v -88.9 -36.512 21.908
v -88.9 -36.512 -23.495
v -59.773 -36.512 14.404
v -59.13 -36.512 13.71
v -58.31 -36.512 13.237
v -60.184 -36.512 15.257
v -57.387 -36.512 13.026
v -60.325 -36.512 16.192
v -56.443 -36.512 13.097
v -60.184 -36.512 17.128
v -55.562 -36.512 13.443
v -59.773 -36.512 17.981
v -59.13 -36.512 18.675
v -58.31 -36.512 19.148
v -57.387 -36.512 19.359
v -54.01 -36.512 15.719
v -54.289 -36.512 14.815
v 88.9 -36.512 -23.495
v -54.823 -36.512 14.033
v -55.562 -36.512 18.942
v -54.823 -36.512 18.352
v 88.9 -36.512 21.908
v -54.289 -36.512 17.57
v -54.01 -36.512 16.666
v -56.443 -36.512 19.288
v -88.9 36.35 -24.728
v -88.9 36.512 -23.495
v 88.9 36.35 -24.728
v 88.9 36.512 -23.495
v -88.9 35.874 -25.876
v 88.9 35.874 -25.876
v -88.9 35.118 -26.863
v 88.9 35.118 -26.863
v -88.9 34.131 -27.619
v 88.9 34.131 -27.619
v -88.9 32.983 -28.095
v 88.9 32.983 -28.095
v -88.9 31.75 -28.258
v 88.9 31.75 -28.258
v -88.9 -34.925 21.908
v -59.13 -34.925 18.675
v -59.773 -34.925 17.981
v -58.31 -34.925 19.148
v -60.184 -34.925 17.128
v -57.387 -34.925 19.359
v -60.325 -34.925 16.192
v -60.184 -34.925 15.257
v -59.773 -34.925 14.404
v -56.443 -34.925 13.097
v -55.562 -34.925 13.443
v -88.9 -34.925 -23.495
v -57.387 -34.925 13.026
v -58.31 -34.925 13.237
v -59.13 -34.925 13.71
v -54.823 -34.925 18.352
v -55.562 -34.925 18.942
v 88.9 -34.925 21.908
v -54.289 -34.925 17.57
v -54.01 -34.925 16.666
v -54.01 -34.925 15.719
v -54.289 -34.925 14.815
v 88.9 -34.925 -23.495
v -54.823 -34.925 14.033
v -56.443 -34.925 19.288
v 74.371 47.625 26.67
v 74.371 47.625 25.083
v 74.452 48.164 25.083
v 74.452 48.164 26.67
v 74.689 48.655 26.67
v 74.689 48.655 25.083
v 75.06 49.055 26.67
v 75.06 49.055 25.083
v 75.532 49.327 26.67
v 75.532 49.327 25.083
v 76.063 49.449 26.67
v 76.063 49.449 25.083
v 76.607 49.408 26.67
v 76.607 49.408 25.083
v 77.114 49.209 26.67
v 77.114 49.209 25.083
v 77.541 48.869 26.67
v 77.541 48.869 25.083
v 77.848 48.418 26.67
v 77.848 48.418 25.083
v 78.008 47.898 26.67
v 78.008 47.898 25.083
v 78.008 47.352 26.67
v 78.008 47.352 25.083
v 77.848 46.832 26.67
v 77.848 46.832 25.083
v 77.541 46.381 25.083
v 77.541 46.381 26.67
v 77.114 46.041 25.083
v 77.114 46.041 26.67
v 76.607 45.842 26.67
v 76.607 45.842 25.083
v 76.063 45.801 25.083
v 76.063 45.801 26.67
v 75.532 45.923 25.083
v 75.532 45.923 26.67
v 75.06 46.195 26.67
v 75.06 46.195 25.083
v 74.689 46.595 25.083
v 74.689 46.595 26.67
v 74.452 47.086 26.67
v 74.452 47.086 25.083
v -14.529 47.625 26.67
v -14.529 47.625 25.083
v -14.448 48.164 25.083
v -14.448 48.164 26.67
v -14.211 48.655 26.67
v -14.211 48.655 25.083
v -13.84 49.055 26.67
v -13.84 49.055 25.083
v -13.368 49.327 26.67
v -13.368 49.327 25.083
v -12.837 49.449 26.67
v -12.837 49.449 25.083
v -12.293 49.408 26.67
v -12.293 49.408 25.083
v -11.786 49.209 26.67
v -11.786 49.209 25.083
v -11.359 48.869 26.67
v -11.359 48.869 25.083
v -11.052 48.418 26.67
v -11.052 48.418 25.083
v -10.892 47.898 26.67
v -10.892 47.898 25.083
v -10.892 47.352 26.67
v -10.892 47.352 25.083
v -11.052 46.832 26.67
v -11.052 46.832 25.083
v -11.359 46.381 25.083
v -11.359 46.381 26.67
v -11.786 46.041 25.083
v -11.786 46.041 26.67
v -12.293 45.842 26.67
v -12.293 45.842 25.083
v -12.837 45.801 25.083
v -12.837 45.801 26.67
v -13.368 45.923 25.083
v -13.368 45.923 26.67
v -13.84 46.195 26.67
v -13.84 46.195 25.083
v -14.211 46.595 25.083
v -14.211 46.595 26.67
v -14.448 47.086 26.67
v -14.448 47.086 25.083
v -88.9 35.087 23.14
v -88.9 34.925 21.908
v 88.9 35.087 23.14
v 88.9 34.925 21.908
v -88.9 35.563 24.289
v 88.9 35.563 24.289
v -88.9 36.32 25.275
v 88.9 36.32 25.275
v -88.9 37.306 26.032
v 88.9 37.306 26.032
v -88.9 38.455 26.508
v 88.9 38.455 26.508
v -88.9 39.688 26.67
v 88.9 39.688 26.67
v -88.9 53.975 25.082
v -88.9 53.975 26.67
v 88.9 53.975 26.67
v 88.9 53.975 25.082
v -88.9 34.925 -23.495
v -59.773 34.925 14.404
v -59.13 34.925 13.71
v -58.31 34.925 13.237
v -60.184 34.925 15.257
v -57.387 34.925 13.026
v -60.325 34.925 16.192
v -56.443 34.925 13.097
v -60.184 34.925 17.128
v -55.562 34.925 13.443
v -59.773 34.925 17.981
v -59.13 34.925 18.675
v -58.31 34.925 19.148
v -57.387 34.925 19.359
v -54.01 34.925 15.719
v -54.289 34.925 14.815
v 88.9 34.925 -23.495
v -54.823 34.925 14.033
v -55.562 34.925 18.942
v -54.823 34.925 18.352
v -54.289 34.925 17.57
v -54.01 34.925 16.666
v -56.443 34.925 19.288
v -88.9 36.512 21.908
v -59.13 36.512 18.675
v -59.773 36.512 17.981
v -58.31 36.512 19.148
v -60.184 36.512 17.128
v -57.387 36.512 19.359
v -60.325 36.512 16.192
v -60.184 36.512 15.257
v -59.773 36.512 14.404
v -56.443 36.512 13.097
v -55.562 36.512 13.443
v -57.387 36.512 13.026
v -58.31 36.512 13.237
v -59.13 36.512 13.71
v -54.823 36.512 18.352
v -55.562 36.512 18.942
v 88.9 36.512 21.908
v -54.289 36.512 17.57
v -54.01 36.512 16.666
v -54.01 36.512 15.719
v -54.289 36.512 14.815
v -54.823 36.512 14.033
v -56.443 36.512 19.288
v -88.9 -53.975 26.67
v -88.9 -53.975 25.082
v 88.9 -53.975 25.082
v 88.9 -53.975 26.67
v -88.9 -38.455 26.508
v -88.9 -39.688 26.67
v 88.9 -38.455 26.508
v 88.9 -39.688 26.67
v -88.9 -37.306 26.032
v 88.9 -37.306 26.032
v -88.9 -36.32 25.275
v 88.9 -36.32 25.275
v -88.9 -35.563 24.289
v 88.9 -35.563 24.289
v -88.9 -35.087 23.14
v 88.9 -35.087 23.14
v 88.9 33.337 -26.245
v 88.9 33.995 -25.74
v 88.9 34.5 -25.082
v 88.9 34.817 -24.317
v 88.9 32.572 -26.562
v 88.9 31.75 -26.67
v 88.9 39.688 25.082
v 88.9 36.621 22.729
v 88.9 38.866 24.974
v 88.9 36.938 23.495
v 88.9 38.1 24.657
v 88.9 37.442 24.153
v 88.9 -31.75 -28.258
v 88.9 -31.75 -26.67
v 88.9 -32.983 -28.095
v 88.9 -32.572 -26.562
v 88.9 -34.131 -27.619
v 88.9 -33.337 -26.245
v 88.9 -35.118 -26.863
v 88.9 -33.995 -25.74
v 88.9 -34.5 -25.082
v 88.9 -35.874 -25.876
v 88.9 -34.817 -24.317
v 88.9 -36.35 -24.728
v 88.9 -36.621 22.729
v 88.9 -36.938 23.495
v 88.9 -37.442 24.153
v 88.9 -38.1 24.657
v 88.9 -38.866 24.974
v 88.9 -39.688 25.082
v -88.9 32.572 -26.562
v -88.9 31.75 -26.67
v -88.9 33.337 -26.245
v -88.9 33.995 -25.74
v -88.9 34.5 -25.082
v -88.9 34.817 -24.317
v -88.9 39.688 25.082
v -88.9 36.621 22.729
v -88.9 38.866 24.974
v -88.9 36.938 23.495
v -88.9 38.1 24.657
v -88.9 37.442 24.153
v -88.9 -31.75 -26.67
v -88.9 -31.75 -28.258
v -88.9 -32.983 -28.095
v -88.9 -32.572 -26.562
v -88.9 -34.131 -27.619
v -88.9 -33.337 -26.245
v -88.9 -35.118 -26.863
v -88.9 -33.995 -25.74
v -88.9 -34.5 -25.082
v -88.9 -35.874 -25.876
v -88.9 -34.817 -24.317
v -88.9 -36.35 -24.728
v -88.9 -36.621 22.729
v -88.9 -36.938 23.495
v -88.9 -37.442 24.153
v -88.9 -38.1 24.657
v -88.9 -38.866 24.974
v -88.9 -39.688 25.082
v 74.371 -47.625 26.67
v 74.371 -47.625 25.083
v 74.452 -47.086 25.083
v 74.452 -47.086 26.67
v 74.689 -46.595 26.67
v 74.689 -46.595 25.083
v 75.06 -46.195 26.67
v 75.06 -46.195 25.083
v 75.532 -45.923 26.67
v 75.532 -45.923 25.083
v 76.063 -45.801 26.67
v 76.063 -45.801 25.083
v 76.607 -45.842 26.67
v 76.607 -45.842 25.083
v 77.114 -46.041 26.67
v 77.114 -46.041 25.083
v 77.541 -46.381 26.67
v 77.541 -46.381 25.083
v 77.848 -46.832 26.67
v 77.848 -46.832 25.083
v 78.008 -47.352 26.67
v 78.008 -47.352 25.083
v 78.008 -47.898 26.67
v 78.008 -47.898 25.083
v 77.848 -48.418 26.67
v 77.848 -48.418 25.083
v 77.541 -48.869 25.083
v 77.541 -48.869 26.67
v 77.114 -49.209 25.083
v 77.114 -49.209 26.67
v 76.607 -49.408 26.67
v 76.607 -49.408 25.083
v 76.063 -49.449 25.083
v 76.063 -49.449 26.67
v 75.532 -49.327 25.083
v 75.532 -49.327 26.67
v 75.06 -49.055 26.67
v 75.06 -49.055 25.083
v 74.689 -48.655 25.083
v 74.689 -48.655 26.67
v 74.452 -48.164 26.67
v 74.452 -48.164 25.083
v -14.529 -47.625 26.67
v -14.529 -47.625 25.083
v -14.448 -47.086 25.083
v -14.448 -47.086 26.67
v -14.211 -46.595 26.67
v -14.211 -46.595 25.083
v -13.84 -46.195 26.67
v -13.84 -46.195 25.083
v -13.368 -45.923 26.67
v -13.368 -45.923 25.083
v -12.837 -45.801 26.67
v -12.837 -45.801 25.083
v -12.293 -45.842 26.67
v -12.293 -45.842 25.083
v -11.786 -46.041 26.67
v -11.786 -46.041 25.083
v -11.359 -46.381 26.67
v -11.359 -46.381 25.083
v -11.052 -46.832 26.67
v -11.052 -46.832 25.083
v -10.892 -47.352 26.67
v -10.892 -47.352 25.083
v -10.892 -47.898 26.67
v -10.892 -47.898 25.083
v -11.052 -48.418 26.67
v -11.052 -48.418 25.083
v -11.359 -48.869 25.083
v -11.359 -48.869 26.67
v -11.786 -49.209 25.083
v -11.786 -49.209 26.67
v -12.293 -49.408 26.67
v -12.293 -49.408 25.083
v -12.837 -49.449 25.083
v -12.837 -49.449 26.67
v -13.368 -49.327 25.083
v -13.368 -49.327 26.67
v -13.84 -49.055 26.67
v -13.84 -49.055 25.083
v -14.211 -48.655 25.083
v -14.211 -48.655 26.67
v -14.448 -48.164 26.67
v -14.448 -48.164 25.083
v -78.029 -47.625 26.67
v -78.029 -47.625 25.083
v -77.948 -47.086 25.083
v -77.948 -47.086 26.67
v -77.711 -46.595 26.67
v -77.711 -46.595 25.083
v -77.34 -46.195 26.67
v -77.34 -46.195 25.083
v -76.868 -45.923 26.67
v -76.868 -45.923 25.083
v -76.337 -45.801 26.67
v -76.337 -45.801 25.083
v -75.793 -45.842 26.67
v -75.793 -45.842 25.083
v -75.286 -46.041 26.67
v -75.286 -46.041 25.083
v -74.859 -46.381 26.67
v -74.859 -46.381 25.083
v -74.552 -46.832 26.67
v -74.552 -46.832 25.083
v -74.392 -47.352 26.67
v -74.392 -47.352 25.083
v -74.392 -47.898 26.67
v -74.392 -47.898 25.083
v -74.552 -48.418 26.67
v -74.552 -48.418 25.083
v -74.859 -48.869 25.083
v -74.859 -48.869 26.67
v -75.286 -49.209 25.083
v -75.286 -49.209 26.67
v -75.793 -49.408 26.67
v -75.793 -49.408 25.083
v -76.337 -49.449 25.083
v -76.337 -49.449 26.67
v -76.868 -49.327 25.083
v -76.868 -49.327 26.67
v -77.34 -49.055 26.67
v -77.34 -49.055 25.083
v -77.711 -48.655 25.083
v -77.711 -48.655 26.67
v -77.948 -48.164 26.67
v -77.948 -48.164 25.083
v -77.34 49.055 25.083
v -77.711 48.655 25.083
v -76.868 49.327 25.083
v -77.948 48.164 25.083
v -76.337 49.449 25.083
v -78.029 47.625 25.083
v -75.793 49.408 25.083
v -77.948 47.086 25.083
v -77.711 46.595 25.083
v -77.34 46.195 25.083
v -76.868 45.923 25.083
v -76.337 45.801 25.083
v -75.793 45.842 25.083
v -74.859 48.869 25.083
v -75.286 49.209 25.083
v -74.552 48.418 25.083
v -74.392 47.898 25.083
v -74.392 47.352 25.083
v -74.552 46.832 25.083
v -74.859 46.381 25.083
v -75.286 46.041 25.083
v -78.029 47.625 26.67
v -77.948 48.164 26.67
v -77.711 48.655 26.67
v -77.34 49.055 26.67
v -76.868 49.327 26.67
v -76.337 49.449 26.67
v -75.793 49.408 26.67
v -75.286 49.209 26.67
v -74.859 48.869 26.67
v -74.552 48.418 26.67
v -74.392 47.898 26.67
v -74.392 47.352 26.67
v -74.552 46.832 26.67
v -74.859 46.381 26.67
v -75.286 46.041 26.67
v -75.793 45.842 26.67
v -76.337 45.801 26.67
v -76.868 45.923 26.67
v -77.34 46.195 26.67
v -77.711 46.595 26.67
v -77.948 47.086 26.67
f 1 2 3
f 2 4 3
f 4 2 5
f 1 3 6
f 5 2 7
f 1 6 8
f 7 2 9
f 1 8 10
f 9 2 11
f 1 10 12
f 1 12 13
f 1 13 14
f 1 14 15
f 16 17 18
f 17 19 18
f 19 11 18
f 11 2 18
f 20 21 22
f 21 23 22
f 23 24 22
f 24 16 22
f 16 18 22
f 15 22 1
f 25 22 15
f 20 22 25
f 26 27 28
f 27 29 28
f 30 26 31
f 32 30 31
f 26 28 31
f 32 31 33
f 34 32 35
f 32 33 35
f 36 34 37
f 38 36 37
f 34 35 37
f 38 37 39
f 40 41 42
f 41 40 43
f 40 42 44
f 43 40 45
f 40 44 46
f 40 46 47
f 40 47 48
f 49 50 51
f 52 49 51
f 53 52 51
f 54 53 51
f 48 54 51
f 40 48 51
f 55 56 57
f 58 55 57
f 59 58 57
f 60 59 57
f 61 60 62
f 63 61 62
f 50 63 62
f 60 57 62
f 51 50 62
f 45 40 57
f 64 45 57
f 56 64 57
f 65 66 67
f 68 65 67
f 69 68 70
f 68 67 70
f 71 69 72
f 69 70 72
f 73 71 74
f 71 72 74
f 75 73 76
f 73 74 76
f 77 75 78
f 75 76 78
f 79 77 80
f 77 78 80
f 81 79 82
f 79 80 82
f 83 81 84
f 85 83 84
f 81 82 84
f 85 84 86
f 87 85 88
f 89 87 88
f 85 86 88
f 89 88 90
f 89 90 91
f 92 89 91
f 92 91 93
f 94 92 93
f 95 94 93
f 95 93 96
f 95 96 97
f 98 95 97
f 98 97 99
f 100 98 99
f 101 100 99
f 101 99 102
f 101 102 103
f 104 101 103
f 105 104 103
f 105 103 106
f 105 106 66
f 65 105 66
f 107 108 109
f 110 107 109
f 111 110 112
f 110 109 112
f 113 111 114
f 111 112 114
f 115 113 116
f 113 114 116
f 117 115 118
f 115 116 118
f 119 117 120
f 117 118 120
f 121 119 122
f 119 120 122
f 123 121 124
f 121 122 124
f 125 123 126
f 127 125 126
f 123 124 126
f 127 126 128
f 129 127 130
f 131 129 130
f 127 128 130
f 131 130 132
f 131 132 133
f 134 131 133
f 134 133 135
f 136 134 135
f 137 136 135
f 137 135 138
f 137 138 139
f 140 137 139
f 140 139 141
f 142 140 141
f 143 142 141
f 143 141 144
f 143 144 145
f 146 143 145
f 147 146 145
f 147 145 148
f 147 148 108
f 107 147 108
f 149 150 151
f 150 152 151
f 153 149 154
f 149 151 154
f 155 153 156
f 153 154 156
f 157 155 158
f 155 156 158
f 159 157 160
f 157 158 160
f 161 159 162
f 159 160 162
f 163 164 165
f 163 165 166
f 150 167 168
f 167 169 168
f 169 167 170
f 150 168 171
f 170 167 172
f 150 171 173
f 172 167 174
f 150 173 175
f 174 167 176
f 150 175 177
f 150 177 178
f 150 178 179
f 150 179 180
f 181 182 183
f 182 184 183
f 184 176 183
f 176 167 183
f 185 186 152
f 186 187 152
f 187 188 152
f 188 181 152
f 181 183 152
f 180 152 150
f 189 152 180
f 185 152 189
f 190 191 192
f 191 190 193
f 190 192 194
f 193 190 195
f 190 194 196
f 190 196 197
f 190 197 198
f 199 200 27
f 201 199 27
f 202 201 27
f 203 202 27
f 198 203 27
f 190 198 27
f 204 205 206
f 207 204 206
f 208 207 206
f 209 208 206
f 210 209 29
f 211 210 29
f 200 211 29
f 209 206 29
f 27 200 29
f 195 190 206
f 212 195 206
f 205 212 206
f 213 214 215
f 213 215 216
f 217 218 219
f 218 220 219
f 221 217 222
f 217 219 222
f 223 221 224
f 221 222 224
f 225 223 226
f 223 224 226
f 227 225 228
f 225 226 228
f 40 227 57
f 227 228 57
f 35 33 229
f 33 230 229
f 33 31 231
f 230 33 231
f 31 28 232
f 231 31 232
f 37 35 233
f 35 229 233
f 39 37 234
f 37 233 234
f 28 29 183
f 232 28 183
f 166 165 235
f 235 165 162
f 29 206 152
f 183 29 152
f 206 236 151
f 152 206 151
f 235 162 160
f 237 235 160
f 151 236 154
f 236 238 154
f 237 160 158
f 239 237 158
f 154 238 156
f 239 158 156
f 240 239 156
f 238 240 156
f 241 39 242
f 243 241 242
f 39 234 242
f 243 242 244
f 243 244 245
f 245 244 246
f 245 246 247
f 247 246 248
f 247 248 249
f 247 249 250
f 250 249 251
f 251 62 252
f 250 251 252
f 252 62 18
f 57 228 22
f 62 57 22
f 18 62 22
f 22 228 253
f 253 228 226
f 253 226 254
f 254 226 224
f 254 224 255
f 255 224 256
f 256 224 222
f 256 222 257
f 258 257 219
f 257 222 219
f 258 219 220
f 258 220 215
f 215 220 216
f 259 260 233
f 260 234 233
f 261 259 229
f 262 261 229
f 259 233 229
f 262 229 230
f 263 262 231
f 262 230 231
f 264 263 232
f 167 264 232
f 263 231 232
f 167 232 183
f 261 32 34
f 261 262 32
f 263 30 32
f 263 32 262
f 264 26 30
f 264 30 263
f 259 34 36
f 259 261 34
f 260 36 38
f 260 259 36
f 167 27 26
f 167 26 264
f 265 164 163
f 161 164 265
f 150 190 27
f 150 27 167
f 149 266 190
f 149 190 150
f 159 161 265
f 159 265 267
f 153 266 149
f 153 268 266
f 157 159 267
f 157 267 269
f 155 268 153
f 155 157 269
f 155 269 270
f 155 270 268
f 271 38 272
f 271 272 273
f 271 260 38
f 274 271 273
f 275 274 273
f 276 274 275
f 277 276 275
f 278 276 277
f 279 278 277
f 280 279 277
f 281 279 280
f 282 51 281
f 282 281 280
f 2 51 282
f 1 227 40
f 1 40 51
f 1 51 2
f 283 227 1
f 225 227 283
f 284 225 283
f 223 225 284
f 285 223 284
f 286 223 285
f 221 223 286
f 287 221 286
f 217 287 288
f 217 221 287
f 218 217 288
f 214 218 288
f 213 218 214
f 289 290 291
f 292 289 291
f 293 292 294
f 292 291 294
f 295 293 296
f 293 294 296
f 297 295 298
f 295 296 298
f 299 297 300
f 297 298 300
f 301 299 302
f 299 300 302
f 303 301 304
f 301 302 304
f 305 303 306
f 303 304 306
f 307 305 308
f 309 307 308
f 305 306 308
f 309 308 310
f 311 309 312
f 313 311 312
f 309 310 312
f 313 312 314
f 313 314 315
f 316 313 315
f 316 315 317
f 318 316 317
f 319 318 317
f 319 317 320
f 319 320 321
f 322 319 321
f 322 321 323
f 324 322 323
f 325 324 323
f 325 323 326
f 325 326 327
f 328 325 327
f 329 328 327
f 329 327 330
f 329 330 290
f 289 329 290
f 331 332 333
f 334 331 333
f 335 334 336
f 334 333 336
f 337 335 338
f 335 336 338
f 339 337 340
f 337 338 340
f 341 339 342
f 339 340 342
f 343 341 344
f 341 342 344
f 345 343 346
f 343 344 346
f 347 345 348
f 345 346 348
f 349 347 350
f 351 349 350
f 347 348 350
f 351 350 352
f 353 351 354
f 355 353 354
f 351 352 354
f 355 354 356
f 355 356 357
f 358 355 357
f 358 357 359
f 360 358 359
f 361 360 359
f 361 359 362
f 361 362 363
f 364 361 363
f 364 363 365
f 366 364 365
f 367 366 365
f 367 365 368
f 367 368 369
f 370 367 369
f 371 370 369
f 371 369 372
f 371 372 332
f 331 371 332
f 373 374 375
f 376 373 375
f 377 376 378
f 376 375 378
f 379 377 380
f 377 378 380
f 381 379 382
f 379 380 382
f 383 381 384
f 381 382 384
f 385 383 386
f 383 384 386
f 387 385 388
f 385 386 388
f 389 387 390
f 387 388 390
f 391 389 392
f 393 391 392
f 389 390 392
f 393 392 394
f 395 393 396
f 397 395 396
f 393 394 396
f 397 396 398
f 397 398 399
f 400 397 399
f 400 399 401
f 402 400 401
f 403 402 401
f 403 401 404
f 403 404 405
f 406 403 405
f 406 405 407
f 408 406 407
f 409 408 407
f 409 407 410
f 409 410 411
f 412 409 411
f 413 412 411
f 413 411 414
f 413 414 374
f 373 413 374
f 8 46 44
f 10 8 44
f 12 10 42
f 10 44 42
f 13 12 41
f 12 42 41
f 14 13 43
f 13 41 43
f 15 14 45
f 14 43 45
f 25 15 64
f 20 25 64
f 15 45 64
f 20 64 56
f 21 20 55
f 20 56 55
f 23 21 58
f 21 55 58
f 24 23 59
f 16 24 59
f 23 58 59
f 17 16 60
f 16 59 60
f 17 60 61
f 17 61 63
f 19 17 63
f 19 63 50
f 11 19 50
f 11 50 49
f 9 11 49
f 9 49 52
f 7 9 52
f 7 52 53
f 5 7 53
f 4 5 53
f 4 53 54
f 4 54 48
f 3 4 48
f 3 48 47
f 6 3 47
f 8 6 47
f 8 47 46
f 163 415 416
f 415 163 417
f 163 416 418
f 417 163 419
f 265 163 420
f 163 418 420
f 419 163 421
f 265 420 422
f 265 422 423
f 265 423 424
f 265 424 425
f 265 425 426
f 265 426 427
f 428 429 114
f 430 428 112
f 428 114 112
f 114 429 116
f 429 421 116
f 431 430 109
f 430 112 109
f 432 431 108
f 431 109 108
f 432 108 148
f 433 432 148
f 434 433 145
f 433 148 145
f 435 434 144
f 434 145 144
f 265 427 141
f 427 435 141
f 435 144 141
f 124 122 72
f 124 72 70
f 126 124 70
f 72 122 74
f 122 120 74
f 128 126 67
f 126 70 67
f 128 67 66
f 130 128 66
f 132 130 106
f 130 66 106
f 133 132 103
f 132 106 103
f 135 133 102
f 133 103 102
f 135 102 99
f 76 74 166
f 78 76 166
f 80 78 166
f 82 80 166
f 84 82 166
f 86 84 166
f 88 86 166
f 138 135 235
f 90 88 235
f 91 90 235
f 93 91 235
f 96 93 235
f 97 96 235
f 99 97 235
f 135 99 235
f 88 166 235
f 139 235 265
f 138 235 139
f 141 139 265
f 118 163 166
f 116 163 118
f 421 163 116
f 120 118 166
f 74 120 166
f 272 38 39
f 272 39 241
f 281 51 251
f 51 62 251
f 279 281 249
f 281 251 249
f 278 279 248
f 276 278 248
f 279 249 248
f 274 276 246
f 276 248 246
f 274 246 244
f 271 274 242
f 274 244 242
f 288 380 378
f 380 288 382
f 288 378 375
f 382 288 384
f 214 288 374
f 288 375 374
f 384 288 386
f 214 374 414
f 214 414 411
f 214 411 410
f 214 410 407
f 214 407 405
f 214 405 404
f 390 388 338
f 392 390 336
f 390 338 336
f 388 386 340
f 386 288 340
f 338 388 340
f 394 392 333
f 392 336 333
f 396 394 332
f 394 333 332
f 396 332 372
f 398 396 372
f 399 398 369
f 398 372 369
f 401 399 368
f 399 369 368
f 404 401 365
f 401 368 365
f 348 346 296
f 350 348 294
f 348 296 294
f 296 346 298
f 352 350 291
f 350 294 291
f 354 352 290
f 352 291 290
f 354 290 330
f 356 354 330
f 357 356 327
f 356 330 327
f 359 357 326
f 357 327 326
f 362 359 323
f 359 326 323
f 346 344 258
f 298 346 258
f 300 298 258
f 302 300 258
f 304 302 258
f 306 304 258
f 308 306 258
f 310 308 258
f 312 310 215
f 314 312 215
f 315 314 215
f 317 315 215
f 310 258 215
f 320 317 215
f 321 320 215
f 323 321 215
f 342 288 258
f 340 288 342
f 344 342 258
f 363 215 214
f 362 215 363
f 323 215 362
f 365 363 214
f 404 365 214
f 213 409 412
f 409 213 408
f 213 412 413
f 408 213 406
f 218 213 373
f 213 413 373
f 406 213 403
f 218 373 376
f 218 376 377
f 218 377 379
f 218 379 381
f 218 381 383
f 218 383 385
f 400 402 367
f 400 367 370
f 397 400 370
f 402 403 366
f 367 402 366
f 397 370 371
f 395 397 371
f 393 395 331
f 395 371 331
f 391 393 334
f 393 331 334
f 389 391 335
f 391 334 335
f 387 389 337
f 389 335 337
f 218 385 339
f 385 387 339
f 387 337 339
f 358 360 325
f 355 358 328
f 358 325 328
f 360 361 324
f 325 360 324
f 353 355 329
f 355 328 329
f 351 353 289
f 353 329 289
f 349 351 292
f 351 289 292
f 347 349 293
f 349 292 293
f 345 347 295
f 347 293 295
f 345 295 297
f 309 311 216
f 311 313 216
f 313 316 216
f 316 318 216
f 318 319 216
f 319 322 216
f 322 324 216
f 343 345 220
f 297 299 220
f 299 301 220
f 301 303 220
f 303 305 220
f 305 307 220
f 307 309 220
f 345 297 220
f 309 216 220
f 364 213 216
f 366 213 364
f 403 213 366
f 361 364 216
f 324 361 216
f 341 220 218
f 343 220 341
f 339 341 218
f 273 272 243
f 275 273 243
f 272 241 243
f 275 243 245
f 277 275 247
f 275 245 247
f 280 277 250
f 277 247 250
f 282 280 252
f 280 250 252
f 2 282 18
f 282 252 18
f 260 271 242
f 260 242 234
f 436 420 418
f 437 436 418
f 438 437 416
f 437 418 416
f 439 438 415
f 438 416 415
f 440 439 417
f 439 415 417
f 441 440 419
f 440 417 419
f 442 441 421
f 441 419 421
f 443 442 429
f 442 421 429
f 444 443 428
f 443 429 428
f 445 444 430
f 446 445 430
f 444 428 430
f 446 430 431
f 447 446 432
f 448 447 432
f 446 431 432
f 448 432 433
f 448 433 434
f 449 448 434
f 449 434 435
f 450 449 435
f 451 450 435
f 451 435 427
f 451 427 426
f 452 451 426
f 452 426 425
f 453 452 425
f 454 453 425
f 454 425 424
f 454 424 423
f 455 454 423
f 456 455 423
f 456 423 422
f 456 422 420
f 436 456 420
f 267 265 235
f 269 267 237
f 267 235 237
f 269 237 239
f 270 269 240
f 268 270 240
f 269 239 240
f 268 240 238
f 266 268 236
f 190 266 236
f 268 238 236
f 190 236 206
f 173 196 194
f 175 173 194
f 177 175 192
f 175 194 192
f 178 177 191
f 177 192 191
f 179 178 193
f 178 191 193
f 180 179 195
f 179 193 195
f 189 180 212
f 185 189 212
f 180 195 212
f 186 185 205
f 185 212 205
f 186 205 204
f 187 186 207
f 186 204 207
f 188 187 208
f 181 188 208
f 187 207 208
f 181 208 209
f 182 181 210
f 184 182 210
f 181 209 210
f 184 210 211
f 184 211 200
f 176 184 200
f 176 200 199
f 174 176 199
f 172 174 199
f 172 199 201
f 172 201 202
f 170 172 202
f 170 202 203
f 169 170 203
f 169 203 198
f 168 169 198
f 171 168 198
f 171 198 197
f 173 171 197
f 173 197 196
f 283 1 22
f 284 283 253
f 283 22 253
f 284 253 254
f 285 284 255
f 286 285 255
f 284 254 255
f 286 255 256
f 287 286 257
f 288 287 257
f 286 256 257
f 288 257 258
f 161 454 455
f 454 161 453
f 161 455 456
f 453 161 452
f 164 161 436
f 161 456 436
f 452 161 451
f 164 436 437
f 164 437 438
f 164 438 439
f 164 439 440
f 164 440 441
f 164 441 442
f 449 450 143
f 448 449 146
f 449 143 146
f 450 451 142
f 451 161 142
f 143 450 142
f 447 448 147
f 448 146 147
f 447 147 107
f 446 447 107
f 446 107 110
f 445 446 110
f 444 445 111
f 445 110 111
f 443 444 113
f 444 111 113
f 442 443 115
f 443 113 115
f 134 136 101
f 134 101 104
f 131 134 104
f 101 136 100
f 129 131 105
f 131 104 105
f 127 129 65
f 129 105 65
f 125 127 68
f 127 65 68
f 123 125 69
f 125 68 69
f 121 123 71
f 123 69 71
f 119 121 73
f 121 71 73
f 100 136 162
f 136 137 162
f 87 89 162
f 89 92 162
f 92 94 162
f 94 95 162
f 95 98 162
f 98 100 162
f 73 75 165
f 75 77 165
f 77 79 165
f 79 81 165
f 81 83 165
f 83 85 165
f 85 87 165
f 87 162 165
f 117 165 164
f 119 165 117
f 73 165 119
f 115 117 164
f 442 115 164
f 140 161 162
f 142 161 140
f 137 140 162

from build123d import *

# Parameters (mm, degrees)
BASE_FLANGE1_DEPTH          = 88.9
F_27_0_144_DIAMETER_HOLE1_D = 3.6576
F_1_4_0_25_DIAMETER_HOLE1_D = 6.35


# Sheet-metal steps are written as plain solids
with BuildPart() as part:
    # Sketch1 → Base-Flange1 (new, symmetric)
    with BuildSketch(Plane.YZ):
        with BuildLine():
            Line((-53.975, 26.67), (-39.6875, 26.67))
            ThreePointArc((-39.6875, 26.67), (-36.319903955, 25.275096045), (-34.925, 21.9075))
            Line((-34.925, 21.9075), (-34.925, -23.495))
            ThreePointArc((-34.925, -23.495), (-33.99506403, -25.74006403), (-31.75, -26.67))
            Line((-31.75, -26.67), (31.75, -26.67))
            ThreePointArc((31.75, -26.67), (33.99506403, -25.74006403), (34.925, -23.495))
            Line((34.925, -23.495), (34.925, 21.9075))
            ThreePointArc((34.925, 21.9075), (36.319903955, 25.275096045), (39.6875, 26.67))
            Line((39.6875, 26.67), (53.975, 26.67))
            Line((53.975, 26.67), (53.975, 25.0825))
            Line((53.975, 25.0825), (39.6875, 25.0825))
            ThreePointArc((39.6875, 25.0825), (37.44243597, 24.15256403), (36.5125, 21.9075))
            Line((36.5125, 21.9075), (36.5125, -23.495))
            ThreePointArc((36.5125, -23.495), (35.117596045, -26.862596045), (31.75, -28.2575))
            Line((31.75, -28.2575), (-31.75, -28.2575))
            ThreePointArc((-31.75, -28.2575), (-35.117596045, -26.862596045), (-36.5125, -23.495))
            Line((-36.5125, -23.495), (-36.5125, 21.9075))
            ThreePointArc((-36.5125, 21.9075), (-37.44243597, 24.15256403), (-39.6875, 25.0825))
            Line((-39.6875, 25.0825), (-53.975, 25.0825))
            Line((-53.975, 25.0825), (-53.975, 26.67))
        make_face()
    extrude(amount=BASE_FLANGE1_DEPTH, both=True)

    # #27 (0.144) Diameter Hole1 (through all)
    with Locations(Plane.XY.offset(26.67)):
        with Locations((-76.2, 47.625), (-12.7, 47.625), (76.2, 47.625), (76.2, -47.625), (-12.7, -47.625), (-76.2, -47.625)):
            Hole(F_27_0_144_DIAMETER_HOLE1_D / 2)

    # 1/4 (0.25) Diameter Hole1 (through all)
    with Locations(Plane.XZ.offset(36.5125)):
        with Locations((-57.15, 16.1925)):
            Hole(F_1_4_0_25_DIAMETER_HOLE1_D / 2)


solid = part.part
